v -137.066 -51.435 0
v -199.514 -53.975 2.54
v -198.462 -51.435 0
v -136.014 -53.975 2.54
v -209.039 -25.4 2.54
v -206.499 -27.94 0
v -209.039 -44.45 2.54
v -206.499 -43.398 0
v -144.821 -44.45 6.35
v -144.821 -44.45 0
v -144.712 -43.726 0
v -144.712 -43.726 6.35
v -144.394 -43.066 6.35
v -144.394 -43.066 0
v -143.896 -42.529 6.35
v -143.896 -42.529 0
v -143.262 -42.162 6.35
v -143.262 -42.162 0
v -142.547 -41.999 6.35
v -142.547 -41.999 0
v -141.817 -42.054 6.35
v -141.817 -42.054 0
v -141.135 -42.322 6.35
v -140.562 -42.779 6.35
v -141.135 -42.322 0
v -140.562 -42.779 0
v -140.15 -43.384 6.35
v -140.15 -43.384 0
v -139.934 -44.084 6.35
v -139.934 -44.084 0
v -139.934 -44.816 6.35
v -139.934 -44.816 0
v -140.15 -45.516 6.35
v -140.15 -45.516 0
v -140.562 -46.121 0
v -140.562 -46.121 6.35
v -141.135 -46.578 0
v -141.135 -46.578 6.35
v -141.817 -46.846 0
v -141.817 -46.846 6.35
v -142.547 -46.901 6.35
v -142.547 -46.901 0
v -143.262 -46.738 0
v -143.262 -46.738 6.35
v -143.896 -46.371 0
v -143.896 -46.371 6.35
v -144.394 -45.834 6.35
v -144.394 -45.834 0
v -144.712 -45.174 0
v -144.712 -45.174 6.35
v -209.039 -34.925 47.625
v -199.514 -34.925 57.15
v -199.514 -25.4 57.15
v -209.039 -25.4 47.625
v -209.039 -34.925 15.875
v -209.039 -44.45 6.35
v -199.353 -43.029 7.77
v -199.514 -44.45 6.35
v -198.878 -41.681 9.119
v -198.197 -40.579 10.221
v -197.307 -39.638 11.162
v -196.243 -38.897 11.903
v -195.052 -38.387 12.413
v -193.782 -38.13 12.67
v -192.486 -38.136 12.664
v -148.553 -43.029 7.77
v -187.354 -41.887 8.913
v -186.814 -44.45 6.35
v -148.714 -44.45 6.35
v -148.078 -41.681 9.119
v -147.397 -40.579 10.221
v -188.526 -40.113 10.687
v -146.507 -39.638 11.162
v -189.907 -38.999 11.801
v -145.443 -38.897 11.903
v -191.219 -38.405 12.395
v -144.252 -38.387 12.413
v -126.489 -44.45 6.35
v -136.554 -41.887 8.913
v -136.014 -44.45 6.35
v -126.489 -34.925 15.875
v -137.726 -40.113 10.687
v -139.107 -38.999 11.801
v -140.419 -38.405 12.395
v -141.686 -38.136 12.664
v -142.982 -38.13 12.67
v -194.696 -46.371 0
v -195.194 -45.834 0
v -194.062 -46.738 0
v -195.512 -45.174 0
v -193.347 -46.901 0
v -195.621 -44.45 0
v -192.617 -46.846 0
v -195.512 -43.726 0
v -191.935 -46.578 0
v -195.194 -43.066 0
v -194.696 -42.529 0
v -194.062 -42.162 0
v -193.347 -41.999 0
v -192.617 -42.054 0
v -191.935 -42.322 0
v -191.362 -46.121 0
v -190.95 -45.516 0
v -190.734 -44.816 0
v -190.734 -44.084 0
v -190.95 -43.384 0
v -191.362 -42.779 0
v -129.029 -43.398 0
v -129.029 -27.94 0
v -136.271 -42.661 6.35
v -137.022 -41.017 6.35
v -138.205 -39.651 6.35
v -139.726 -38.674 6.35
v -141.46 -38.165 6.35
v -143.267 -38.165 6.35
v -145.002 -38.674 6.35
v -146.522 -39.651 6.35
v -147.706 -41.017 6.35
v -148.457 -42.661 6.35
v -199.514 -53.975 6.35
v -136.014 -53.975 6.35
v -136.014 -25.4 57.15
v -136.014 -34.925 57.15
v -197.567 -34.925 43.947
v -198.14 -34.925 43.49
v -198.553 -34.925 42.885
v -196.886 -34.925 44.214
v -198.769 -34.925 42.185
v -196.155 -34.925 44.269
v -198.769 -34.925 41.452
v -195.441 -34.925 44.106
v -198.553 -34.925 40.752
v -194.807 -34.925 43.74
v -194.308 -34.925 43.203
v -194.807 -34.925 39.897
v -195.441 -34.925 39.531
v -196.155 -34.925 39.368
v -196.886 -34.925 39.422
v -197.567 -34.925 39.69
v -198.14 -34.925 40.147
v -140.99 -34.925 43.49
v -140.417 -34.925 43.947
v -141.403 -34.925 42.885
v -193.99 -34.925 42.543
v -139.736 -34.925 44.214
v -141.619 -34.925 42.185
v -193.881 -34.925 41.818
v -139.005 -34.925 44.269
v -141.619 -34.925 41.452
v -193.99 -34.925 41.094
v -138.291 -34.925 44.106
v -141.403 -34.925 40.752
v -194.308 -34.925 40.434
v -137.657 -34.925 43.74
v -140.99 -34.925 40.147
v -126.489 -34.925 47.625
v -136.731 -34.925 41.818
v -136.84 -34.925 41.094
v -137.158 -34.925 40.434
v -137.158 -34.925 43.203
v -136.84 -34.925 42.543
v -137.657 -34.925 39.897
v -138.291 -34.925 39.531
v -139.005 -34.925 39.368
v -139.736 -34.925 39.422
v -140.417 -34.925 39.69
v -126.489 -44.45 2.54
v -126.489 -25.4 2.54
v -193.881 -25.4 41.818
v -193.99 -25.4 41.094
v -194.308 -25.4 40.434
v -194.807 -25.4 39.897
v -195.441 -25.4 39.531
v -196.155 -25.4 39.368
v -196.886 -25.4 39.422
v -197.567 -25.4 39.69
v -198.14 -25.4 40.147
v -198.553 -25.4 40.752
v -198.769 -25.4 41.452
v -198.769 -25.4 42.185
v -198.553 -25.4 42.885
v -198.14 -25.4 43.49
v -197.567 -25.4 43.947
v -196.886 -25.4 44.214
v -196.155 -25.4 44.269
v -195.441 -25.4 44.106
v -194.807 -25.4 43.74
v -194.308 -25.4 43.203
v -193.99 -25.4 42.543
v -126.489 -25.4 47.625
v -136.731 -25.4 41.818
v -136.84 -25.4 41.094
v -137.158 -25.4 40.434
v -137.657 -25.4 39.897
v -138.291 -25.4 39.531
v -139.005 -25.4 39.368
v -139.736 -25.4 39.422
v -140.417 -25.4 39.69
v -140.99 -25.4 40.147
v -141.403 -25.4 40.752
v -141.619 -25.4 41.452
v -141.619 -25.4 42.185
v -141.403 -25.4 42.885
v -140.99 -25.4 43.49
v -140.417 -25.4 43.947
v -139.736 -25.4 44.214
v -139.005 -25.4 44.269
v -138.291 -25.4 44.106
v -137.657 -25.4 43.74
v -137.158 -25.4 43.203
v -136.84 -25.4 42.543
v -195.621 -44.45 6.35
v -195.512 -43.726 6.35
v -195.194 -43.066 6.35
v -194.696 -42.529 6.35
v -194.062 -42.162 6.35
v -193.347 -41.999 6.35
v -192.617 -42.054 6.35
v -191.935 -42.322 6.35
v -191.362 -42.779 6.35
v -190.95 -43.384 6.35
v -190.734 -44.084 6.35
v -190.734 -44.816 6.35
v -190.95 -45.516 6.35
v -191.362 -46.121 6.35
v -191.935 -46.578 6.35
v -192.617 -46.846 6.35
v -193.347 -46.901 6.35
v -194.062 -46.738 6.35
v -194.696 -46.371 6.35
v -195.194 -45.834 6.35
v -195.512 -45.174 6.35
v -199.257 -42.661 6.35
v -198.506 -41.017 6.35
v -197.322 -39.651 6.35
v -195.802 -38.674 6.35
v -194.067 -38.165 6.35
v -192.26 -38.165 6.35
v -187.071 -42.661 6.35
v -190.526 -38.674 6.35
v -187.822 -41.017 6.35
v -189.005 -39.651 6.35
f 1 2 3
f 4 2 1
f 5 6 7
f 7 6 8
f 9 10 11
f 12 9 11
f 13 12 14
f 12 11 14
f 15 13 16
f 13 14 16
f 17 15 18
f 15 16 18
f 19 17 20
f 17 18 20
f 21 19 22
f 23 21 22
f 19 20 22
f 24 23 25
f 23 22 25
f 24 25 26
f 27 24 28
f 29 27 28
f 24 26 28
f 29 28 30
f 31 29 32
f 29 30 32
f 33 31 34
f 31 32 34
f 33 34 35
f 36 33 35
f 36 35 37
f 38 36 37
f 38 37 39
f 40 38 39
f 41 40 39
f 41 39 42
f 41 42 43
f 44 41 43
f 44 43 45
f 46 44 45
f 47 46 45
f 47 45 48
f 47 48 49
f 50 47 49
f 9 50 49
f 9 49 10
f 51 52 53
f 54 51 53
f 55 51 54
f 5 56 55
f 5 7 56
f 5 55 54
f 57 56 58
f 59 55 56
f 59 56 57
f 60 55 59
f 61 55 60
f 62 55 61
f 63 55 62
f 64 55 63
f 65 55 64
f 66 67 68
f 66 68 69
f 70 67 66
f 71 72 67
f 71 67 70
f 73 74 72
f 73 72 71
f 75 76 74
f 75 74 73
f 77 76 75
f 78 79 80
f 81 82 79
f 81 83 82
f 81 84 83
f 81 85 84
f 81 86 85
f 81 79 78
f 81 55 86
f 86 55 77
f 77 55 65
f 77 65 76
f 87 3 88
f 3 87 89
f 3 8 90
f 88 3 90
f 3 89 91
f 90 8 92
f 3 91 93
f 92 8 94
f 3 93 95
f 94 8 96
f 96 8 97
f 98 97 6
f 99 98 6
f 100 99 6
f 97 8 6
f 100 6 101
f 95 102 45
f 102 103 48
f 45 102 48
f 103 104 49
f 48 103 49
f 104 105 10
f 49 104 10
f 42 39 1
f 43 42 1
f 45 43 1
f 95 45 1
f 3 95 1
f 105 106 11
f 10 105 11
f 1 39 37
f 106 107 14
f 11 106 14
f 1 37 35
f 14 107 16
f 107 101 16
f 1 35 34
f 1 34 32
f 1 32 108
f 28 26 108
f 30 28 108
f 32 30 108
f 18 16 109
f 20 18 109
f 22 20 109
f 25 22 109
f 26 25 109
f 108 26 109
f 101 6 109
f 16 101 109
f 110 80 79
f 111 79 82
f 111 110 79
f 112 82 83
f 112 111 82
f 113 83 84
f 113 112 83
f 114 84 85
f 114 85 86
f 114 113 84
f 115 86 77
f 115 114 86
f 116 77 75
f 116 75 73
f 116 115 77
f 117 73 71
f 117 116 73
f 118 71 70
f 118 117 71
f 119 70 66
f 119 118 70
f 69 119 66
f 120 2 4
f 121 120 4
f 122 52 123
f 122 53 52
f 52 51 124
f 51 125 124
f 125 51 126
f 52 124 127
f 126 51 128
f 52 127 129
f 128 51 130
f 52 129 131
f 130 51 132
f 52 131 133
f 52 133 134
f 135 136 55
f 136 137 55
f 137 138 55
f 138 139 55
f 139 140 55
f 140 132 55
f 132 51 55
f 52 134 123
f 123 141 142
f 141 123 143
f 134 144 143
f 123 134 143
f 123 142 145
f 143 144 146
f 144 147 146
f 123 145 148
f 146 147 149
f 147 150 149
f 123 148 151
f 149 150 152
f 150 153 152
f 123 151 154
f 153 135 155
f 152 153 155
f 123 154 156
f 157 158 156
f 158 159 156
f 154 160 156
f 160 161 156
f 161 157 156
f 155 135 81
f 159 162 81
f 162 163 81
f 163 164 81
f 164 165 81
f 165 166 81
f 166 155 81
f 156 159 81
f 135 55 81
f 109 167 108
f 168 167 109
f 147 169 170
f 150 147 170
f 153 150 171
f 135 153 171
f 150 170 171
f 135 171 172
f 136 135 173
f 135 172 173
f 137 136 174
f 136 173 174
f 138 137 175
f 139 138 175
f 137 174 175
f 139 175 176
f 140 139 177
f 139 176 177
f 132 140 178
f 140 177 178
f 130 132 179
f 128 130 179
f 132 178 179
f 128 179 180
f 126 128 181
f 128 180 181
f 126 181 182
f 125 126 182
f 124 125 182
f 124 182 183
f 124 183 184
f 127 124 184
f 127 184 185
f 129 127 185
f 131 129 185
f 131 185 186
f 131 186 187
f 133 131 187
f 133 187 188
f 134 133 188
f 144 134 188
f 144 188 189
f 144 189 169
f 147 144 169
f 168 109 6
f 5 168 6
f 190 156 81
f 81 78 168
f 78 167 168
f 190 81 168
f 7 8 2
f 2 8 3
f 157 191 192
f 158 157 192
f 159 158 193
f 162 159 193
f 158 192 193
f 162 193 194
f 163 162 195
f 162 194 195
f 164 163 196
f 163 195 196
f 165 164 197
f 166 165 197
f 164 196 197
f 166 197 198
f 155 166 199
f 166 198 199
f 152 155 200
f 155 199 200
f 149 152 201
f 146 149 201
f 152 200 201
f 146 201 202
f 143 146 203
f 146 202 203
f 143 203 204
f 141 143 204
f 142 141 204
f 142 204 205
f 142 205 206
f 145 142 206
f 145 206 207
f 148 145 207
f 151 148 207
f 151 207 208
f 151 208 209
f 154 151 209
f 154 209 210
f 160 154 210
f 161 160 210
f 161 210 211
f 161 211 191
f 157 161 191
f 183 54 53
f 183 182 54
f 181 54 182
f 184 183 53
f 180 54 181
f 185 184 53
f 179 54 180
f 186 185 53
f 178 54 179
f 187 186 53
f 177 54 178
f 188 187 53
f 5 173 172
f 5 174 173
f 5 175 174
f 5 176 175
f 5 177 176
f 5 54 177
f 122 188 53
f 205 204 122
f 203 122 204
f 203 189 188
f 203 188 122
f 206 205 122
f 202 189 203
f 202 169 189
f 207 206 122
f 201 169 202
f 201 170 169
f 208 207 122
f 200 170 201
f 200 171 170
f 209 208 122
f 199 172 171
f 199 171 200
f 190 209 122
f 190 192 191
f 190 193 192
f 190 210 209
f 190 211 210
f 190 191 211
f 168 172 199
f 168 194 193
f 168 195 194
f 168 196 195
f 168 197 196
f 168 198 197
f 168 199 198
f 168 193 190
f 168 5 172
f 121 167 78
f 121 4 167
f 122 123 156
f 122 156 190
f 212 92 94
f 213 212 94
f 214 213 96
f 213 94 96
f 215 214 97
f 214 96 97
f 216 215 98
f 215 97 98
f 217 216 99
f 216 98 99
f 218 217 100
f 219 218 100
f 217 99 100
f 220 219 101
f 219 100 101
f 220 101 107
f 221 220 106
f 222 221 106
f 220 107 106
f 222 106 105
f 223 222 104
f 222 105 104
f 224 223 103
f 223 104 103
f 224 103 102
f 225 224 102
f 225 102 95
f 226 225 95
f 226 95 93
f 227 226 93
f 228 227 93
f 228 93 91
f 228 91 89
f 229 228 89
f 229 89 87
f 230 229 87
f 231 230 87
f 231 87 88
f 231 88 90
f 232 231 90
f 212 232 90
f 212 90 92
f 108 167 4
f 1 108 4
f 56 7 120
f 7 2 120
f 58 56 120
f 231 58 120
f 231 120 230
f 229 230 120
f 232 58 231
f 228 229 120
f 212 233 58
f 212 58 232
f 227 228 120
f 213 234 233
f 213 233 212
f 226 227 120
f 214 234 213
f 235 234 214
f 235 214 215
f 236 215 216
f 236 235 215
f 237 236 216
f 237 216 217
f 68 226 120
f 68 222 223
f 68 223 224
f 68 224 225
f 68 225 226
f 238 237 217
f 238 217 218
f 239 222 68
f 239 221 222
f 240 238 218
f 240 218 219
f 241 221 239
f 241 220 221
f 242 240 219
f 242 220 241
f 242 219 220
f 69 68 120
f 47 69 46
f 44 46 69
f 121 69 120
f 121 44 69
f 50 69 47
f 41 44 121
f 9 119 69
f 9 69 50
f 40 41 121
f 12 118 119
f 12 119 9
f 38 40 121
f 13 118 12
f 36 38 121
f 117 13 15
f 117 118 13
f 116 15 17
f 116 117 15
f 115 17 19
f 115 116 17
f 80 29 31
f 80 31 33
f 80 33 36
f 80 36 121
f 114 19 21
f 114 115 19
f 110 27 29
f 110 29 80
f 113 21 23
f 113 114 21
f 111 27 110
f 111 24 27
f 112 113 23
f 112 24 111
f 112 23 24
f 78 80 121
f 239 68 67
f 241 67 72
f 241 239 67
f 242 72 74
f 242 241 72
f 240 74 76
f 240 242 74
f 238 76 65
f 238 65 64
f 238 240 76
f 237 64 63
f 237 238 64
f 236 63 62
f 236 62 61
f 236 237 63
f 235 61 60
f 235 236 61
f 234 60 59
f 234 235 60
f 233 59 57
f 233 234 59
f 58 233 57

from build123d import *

# Parameters (mm, degrees)
BOSS_EXTRUDE1_DEPTH   = 6.35
SKETCH2_W             = 82.55
SKETCH2_H             = 9.525
BOSS_EXTRUDE2_DEPTH   = 50.8
CHAMFER1_SIZE         = 9.525
F_8_CLEARANCE_HOLE1_D = 4.9149
CUT_EXTRUDE1_REACH    = 223.791
SKETCH5_R             = 6.35
F_8_CLEARANCE_HOLE2_D = 4.9149
CHAMFER2_SIZE         = 2.54


with BuildPart() as part:
    # Sketch1 → Boss-Extrude1 (new body)
    with BuildSketch(Plane.XY):
        Polygon((-151.095016336, -53.975), (-126.488766336, -53.975), (-126.488766336, -25.4), (-209.038766336, -25.4), (-209.038766336, -53.975), align=None)
    extrude(amount=BOSS_EXTRUDE1_DEPTH)

    # Sketch2 → Boss-Extrude2 (add)
    with BuildSketch(Plane.XY.offset(6.35)):
        with Locations((-167.763766336, -30.1625)):
            Rectangle(SKETCH2_W, SKETCH2_H)
    extrude(amount=BOSS_EXTRUDE2_DEPTH)

    # Chamfer1
    chamfer1_edges = [part.edges().sort_by_distance(p)[0] for p in [
        (-167.763766336, -34.925, 6.35),
        (-126.488766336, -53.975, 3.175),
        (-126.488766336, -30.1625, 57.15),
        (-209.038766336, -30.1625, 57.15),
        (-209.038766336, -53.975, 3.175),
    ]]
    chamfer(chamfer1_edges, length=CHAMFER1_SIZE - 0.0001)  # a hair under: the kernel refuses the full size

    # #8 Clearance Hole1 (through all)
    with Locations(Plane.XY.offset(57.15)):
        with Locations((-193.163766336, -44.45), (-142.363766336, -44.45)):
            Hole(F_8_CLEARANCE_HOLE1_D / 2)

    # Sketch5 → Cut-Extrude1 (cut, up to next)
    with BuildSketch(Plane.XY.offset(6.35), mode=Mode.PRIVATE) as cut_extrude1_sk1:
        with Locations((-193.163766336, -44.45)):
            Circle(SKETCH5_R)
    cut_extrude1_tool1 = extrude(cut_extrude1_sk1.sketch, amount=CUT_EXTRUDE1_REACH, mode=Mode.PRIVATE) & part.part
    # Sketch5 → Cut-Extrude1 (cut, up to next)
    with BuildSketch(Plane.XY.offset(6.35), mode=Mode.PRIVATE) as cut_extrude1_sk2:
        with Locations((-142.363766336, -44.45)):
            Circle(SKETCH5_R)
    cut_extrude1_tool2 = extrude(cut_extrude1_sk2.sketch, amount=CUT_EXTRUDE1_REACH, mode=Mode.PRIVATE) & part.part
    add(cut_extrude1_tool1.solids().sort_by_distance((-193.163766, -44.45, 6.35))[0], mode=Mode.SUBTRACT)
    add(cut_extrude1_tool2.solids().sort_by_distance((-142.363766, -44.45, 6.35))[0], mode=Mode.SUBTRACT)

    # #8 Clearance Hole2 (through all)
    with Locations(Plane(origin=(0, -34.925, 0), x_dir=(-1, 0, 0), z_dir=(0, -1, 0))):
        with Locations((196.338766336, -41.818328597), (139.188766336, -41.818328597)):
            Hole(F_8_CLEARANCE_HOLE2_D / 2)

    # Chamfer2
    chamfer2_edges = [part.edges().sort_by_distance(p)[0] for p in [
        (-126.488766336, -34.92505, 0),
        (-167.763766336, -53.975, 0),
        (-204.276316336, -49.21255, 0),
        (-131.251216336, -49.21255, 0),
        (-209.038766336, -34.92505, 0),
        (-167.763766336, -25.4, 0),
    ]]
    chamfer(chamfer2_edges, length=CHAMFER2_SIZE)


solid = part.part
